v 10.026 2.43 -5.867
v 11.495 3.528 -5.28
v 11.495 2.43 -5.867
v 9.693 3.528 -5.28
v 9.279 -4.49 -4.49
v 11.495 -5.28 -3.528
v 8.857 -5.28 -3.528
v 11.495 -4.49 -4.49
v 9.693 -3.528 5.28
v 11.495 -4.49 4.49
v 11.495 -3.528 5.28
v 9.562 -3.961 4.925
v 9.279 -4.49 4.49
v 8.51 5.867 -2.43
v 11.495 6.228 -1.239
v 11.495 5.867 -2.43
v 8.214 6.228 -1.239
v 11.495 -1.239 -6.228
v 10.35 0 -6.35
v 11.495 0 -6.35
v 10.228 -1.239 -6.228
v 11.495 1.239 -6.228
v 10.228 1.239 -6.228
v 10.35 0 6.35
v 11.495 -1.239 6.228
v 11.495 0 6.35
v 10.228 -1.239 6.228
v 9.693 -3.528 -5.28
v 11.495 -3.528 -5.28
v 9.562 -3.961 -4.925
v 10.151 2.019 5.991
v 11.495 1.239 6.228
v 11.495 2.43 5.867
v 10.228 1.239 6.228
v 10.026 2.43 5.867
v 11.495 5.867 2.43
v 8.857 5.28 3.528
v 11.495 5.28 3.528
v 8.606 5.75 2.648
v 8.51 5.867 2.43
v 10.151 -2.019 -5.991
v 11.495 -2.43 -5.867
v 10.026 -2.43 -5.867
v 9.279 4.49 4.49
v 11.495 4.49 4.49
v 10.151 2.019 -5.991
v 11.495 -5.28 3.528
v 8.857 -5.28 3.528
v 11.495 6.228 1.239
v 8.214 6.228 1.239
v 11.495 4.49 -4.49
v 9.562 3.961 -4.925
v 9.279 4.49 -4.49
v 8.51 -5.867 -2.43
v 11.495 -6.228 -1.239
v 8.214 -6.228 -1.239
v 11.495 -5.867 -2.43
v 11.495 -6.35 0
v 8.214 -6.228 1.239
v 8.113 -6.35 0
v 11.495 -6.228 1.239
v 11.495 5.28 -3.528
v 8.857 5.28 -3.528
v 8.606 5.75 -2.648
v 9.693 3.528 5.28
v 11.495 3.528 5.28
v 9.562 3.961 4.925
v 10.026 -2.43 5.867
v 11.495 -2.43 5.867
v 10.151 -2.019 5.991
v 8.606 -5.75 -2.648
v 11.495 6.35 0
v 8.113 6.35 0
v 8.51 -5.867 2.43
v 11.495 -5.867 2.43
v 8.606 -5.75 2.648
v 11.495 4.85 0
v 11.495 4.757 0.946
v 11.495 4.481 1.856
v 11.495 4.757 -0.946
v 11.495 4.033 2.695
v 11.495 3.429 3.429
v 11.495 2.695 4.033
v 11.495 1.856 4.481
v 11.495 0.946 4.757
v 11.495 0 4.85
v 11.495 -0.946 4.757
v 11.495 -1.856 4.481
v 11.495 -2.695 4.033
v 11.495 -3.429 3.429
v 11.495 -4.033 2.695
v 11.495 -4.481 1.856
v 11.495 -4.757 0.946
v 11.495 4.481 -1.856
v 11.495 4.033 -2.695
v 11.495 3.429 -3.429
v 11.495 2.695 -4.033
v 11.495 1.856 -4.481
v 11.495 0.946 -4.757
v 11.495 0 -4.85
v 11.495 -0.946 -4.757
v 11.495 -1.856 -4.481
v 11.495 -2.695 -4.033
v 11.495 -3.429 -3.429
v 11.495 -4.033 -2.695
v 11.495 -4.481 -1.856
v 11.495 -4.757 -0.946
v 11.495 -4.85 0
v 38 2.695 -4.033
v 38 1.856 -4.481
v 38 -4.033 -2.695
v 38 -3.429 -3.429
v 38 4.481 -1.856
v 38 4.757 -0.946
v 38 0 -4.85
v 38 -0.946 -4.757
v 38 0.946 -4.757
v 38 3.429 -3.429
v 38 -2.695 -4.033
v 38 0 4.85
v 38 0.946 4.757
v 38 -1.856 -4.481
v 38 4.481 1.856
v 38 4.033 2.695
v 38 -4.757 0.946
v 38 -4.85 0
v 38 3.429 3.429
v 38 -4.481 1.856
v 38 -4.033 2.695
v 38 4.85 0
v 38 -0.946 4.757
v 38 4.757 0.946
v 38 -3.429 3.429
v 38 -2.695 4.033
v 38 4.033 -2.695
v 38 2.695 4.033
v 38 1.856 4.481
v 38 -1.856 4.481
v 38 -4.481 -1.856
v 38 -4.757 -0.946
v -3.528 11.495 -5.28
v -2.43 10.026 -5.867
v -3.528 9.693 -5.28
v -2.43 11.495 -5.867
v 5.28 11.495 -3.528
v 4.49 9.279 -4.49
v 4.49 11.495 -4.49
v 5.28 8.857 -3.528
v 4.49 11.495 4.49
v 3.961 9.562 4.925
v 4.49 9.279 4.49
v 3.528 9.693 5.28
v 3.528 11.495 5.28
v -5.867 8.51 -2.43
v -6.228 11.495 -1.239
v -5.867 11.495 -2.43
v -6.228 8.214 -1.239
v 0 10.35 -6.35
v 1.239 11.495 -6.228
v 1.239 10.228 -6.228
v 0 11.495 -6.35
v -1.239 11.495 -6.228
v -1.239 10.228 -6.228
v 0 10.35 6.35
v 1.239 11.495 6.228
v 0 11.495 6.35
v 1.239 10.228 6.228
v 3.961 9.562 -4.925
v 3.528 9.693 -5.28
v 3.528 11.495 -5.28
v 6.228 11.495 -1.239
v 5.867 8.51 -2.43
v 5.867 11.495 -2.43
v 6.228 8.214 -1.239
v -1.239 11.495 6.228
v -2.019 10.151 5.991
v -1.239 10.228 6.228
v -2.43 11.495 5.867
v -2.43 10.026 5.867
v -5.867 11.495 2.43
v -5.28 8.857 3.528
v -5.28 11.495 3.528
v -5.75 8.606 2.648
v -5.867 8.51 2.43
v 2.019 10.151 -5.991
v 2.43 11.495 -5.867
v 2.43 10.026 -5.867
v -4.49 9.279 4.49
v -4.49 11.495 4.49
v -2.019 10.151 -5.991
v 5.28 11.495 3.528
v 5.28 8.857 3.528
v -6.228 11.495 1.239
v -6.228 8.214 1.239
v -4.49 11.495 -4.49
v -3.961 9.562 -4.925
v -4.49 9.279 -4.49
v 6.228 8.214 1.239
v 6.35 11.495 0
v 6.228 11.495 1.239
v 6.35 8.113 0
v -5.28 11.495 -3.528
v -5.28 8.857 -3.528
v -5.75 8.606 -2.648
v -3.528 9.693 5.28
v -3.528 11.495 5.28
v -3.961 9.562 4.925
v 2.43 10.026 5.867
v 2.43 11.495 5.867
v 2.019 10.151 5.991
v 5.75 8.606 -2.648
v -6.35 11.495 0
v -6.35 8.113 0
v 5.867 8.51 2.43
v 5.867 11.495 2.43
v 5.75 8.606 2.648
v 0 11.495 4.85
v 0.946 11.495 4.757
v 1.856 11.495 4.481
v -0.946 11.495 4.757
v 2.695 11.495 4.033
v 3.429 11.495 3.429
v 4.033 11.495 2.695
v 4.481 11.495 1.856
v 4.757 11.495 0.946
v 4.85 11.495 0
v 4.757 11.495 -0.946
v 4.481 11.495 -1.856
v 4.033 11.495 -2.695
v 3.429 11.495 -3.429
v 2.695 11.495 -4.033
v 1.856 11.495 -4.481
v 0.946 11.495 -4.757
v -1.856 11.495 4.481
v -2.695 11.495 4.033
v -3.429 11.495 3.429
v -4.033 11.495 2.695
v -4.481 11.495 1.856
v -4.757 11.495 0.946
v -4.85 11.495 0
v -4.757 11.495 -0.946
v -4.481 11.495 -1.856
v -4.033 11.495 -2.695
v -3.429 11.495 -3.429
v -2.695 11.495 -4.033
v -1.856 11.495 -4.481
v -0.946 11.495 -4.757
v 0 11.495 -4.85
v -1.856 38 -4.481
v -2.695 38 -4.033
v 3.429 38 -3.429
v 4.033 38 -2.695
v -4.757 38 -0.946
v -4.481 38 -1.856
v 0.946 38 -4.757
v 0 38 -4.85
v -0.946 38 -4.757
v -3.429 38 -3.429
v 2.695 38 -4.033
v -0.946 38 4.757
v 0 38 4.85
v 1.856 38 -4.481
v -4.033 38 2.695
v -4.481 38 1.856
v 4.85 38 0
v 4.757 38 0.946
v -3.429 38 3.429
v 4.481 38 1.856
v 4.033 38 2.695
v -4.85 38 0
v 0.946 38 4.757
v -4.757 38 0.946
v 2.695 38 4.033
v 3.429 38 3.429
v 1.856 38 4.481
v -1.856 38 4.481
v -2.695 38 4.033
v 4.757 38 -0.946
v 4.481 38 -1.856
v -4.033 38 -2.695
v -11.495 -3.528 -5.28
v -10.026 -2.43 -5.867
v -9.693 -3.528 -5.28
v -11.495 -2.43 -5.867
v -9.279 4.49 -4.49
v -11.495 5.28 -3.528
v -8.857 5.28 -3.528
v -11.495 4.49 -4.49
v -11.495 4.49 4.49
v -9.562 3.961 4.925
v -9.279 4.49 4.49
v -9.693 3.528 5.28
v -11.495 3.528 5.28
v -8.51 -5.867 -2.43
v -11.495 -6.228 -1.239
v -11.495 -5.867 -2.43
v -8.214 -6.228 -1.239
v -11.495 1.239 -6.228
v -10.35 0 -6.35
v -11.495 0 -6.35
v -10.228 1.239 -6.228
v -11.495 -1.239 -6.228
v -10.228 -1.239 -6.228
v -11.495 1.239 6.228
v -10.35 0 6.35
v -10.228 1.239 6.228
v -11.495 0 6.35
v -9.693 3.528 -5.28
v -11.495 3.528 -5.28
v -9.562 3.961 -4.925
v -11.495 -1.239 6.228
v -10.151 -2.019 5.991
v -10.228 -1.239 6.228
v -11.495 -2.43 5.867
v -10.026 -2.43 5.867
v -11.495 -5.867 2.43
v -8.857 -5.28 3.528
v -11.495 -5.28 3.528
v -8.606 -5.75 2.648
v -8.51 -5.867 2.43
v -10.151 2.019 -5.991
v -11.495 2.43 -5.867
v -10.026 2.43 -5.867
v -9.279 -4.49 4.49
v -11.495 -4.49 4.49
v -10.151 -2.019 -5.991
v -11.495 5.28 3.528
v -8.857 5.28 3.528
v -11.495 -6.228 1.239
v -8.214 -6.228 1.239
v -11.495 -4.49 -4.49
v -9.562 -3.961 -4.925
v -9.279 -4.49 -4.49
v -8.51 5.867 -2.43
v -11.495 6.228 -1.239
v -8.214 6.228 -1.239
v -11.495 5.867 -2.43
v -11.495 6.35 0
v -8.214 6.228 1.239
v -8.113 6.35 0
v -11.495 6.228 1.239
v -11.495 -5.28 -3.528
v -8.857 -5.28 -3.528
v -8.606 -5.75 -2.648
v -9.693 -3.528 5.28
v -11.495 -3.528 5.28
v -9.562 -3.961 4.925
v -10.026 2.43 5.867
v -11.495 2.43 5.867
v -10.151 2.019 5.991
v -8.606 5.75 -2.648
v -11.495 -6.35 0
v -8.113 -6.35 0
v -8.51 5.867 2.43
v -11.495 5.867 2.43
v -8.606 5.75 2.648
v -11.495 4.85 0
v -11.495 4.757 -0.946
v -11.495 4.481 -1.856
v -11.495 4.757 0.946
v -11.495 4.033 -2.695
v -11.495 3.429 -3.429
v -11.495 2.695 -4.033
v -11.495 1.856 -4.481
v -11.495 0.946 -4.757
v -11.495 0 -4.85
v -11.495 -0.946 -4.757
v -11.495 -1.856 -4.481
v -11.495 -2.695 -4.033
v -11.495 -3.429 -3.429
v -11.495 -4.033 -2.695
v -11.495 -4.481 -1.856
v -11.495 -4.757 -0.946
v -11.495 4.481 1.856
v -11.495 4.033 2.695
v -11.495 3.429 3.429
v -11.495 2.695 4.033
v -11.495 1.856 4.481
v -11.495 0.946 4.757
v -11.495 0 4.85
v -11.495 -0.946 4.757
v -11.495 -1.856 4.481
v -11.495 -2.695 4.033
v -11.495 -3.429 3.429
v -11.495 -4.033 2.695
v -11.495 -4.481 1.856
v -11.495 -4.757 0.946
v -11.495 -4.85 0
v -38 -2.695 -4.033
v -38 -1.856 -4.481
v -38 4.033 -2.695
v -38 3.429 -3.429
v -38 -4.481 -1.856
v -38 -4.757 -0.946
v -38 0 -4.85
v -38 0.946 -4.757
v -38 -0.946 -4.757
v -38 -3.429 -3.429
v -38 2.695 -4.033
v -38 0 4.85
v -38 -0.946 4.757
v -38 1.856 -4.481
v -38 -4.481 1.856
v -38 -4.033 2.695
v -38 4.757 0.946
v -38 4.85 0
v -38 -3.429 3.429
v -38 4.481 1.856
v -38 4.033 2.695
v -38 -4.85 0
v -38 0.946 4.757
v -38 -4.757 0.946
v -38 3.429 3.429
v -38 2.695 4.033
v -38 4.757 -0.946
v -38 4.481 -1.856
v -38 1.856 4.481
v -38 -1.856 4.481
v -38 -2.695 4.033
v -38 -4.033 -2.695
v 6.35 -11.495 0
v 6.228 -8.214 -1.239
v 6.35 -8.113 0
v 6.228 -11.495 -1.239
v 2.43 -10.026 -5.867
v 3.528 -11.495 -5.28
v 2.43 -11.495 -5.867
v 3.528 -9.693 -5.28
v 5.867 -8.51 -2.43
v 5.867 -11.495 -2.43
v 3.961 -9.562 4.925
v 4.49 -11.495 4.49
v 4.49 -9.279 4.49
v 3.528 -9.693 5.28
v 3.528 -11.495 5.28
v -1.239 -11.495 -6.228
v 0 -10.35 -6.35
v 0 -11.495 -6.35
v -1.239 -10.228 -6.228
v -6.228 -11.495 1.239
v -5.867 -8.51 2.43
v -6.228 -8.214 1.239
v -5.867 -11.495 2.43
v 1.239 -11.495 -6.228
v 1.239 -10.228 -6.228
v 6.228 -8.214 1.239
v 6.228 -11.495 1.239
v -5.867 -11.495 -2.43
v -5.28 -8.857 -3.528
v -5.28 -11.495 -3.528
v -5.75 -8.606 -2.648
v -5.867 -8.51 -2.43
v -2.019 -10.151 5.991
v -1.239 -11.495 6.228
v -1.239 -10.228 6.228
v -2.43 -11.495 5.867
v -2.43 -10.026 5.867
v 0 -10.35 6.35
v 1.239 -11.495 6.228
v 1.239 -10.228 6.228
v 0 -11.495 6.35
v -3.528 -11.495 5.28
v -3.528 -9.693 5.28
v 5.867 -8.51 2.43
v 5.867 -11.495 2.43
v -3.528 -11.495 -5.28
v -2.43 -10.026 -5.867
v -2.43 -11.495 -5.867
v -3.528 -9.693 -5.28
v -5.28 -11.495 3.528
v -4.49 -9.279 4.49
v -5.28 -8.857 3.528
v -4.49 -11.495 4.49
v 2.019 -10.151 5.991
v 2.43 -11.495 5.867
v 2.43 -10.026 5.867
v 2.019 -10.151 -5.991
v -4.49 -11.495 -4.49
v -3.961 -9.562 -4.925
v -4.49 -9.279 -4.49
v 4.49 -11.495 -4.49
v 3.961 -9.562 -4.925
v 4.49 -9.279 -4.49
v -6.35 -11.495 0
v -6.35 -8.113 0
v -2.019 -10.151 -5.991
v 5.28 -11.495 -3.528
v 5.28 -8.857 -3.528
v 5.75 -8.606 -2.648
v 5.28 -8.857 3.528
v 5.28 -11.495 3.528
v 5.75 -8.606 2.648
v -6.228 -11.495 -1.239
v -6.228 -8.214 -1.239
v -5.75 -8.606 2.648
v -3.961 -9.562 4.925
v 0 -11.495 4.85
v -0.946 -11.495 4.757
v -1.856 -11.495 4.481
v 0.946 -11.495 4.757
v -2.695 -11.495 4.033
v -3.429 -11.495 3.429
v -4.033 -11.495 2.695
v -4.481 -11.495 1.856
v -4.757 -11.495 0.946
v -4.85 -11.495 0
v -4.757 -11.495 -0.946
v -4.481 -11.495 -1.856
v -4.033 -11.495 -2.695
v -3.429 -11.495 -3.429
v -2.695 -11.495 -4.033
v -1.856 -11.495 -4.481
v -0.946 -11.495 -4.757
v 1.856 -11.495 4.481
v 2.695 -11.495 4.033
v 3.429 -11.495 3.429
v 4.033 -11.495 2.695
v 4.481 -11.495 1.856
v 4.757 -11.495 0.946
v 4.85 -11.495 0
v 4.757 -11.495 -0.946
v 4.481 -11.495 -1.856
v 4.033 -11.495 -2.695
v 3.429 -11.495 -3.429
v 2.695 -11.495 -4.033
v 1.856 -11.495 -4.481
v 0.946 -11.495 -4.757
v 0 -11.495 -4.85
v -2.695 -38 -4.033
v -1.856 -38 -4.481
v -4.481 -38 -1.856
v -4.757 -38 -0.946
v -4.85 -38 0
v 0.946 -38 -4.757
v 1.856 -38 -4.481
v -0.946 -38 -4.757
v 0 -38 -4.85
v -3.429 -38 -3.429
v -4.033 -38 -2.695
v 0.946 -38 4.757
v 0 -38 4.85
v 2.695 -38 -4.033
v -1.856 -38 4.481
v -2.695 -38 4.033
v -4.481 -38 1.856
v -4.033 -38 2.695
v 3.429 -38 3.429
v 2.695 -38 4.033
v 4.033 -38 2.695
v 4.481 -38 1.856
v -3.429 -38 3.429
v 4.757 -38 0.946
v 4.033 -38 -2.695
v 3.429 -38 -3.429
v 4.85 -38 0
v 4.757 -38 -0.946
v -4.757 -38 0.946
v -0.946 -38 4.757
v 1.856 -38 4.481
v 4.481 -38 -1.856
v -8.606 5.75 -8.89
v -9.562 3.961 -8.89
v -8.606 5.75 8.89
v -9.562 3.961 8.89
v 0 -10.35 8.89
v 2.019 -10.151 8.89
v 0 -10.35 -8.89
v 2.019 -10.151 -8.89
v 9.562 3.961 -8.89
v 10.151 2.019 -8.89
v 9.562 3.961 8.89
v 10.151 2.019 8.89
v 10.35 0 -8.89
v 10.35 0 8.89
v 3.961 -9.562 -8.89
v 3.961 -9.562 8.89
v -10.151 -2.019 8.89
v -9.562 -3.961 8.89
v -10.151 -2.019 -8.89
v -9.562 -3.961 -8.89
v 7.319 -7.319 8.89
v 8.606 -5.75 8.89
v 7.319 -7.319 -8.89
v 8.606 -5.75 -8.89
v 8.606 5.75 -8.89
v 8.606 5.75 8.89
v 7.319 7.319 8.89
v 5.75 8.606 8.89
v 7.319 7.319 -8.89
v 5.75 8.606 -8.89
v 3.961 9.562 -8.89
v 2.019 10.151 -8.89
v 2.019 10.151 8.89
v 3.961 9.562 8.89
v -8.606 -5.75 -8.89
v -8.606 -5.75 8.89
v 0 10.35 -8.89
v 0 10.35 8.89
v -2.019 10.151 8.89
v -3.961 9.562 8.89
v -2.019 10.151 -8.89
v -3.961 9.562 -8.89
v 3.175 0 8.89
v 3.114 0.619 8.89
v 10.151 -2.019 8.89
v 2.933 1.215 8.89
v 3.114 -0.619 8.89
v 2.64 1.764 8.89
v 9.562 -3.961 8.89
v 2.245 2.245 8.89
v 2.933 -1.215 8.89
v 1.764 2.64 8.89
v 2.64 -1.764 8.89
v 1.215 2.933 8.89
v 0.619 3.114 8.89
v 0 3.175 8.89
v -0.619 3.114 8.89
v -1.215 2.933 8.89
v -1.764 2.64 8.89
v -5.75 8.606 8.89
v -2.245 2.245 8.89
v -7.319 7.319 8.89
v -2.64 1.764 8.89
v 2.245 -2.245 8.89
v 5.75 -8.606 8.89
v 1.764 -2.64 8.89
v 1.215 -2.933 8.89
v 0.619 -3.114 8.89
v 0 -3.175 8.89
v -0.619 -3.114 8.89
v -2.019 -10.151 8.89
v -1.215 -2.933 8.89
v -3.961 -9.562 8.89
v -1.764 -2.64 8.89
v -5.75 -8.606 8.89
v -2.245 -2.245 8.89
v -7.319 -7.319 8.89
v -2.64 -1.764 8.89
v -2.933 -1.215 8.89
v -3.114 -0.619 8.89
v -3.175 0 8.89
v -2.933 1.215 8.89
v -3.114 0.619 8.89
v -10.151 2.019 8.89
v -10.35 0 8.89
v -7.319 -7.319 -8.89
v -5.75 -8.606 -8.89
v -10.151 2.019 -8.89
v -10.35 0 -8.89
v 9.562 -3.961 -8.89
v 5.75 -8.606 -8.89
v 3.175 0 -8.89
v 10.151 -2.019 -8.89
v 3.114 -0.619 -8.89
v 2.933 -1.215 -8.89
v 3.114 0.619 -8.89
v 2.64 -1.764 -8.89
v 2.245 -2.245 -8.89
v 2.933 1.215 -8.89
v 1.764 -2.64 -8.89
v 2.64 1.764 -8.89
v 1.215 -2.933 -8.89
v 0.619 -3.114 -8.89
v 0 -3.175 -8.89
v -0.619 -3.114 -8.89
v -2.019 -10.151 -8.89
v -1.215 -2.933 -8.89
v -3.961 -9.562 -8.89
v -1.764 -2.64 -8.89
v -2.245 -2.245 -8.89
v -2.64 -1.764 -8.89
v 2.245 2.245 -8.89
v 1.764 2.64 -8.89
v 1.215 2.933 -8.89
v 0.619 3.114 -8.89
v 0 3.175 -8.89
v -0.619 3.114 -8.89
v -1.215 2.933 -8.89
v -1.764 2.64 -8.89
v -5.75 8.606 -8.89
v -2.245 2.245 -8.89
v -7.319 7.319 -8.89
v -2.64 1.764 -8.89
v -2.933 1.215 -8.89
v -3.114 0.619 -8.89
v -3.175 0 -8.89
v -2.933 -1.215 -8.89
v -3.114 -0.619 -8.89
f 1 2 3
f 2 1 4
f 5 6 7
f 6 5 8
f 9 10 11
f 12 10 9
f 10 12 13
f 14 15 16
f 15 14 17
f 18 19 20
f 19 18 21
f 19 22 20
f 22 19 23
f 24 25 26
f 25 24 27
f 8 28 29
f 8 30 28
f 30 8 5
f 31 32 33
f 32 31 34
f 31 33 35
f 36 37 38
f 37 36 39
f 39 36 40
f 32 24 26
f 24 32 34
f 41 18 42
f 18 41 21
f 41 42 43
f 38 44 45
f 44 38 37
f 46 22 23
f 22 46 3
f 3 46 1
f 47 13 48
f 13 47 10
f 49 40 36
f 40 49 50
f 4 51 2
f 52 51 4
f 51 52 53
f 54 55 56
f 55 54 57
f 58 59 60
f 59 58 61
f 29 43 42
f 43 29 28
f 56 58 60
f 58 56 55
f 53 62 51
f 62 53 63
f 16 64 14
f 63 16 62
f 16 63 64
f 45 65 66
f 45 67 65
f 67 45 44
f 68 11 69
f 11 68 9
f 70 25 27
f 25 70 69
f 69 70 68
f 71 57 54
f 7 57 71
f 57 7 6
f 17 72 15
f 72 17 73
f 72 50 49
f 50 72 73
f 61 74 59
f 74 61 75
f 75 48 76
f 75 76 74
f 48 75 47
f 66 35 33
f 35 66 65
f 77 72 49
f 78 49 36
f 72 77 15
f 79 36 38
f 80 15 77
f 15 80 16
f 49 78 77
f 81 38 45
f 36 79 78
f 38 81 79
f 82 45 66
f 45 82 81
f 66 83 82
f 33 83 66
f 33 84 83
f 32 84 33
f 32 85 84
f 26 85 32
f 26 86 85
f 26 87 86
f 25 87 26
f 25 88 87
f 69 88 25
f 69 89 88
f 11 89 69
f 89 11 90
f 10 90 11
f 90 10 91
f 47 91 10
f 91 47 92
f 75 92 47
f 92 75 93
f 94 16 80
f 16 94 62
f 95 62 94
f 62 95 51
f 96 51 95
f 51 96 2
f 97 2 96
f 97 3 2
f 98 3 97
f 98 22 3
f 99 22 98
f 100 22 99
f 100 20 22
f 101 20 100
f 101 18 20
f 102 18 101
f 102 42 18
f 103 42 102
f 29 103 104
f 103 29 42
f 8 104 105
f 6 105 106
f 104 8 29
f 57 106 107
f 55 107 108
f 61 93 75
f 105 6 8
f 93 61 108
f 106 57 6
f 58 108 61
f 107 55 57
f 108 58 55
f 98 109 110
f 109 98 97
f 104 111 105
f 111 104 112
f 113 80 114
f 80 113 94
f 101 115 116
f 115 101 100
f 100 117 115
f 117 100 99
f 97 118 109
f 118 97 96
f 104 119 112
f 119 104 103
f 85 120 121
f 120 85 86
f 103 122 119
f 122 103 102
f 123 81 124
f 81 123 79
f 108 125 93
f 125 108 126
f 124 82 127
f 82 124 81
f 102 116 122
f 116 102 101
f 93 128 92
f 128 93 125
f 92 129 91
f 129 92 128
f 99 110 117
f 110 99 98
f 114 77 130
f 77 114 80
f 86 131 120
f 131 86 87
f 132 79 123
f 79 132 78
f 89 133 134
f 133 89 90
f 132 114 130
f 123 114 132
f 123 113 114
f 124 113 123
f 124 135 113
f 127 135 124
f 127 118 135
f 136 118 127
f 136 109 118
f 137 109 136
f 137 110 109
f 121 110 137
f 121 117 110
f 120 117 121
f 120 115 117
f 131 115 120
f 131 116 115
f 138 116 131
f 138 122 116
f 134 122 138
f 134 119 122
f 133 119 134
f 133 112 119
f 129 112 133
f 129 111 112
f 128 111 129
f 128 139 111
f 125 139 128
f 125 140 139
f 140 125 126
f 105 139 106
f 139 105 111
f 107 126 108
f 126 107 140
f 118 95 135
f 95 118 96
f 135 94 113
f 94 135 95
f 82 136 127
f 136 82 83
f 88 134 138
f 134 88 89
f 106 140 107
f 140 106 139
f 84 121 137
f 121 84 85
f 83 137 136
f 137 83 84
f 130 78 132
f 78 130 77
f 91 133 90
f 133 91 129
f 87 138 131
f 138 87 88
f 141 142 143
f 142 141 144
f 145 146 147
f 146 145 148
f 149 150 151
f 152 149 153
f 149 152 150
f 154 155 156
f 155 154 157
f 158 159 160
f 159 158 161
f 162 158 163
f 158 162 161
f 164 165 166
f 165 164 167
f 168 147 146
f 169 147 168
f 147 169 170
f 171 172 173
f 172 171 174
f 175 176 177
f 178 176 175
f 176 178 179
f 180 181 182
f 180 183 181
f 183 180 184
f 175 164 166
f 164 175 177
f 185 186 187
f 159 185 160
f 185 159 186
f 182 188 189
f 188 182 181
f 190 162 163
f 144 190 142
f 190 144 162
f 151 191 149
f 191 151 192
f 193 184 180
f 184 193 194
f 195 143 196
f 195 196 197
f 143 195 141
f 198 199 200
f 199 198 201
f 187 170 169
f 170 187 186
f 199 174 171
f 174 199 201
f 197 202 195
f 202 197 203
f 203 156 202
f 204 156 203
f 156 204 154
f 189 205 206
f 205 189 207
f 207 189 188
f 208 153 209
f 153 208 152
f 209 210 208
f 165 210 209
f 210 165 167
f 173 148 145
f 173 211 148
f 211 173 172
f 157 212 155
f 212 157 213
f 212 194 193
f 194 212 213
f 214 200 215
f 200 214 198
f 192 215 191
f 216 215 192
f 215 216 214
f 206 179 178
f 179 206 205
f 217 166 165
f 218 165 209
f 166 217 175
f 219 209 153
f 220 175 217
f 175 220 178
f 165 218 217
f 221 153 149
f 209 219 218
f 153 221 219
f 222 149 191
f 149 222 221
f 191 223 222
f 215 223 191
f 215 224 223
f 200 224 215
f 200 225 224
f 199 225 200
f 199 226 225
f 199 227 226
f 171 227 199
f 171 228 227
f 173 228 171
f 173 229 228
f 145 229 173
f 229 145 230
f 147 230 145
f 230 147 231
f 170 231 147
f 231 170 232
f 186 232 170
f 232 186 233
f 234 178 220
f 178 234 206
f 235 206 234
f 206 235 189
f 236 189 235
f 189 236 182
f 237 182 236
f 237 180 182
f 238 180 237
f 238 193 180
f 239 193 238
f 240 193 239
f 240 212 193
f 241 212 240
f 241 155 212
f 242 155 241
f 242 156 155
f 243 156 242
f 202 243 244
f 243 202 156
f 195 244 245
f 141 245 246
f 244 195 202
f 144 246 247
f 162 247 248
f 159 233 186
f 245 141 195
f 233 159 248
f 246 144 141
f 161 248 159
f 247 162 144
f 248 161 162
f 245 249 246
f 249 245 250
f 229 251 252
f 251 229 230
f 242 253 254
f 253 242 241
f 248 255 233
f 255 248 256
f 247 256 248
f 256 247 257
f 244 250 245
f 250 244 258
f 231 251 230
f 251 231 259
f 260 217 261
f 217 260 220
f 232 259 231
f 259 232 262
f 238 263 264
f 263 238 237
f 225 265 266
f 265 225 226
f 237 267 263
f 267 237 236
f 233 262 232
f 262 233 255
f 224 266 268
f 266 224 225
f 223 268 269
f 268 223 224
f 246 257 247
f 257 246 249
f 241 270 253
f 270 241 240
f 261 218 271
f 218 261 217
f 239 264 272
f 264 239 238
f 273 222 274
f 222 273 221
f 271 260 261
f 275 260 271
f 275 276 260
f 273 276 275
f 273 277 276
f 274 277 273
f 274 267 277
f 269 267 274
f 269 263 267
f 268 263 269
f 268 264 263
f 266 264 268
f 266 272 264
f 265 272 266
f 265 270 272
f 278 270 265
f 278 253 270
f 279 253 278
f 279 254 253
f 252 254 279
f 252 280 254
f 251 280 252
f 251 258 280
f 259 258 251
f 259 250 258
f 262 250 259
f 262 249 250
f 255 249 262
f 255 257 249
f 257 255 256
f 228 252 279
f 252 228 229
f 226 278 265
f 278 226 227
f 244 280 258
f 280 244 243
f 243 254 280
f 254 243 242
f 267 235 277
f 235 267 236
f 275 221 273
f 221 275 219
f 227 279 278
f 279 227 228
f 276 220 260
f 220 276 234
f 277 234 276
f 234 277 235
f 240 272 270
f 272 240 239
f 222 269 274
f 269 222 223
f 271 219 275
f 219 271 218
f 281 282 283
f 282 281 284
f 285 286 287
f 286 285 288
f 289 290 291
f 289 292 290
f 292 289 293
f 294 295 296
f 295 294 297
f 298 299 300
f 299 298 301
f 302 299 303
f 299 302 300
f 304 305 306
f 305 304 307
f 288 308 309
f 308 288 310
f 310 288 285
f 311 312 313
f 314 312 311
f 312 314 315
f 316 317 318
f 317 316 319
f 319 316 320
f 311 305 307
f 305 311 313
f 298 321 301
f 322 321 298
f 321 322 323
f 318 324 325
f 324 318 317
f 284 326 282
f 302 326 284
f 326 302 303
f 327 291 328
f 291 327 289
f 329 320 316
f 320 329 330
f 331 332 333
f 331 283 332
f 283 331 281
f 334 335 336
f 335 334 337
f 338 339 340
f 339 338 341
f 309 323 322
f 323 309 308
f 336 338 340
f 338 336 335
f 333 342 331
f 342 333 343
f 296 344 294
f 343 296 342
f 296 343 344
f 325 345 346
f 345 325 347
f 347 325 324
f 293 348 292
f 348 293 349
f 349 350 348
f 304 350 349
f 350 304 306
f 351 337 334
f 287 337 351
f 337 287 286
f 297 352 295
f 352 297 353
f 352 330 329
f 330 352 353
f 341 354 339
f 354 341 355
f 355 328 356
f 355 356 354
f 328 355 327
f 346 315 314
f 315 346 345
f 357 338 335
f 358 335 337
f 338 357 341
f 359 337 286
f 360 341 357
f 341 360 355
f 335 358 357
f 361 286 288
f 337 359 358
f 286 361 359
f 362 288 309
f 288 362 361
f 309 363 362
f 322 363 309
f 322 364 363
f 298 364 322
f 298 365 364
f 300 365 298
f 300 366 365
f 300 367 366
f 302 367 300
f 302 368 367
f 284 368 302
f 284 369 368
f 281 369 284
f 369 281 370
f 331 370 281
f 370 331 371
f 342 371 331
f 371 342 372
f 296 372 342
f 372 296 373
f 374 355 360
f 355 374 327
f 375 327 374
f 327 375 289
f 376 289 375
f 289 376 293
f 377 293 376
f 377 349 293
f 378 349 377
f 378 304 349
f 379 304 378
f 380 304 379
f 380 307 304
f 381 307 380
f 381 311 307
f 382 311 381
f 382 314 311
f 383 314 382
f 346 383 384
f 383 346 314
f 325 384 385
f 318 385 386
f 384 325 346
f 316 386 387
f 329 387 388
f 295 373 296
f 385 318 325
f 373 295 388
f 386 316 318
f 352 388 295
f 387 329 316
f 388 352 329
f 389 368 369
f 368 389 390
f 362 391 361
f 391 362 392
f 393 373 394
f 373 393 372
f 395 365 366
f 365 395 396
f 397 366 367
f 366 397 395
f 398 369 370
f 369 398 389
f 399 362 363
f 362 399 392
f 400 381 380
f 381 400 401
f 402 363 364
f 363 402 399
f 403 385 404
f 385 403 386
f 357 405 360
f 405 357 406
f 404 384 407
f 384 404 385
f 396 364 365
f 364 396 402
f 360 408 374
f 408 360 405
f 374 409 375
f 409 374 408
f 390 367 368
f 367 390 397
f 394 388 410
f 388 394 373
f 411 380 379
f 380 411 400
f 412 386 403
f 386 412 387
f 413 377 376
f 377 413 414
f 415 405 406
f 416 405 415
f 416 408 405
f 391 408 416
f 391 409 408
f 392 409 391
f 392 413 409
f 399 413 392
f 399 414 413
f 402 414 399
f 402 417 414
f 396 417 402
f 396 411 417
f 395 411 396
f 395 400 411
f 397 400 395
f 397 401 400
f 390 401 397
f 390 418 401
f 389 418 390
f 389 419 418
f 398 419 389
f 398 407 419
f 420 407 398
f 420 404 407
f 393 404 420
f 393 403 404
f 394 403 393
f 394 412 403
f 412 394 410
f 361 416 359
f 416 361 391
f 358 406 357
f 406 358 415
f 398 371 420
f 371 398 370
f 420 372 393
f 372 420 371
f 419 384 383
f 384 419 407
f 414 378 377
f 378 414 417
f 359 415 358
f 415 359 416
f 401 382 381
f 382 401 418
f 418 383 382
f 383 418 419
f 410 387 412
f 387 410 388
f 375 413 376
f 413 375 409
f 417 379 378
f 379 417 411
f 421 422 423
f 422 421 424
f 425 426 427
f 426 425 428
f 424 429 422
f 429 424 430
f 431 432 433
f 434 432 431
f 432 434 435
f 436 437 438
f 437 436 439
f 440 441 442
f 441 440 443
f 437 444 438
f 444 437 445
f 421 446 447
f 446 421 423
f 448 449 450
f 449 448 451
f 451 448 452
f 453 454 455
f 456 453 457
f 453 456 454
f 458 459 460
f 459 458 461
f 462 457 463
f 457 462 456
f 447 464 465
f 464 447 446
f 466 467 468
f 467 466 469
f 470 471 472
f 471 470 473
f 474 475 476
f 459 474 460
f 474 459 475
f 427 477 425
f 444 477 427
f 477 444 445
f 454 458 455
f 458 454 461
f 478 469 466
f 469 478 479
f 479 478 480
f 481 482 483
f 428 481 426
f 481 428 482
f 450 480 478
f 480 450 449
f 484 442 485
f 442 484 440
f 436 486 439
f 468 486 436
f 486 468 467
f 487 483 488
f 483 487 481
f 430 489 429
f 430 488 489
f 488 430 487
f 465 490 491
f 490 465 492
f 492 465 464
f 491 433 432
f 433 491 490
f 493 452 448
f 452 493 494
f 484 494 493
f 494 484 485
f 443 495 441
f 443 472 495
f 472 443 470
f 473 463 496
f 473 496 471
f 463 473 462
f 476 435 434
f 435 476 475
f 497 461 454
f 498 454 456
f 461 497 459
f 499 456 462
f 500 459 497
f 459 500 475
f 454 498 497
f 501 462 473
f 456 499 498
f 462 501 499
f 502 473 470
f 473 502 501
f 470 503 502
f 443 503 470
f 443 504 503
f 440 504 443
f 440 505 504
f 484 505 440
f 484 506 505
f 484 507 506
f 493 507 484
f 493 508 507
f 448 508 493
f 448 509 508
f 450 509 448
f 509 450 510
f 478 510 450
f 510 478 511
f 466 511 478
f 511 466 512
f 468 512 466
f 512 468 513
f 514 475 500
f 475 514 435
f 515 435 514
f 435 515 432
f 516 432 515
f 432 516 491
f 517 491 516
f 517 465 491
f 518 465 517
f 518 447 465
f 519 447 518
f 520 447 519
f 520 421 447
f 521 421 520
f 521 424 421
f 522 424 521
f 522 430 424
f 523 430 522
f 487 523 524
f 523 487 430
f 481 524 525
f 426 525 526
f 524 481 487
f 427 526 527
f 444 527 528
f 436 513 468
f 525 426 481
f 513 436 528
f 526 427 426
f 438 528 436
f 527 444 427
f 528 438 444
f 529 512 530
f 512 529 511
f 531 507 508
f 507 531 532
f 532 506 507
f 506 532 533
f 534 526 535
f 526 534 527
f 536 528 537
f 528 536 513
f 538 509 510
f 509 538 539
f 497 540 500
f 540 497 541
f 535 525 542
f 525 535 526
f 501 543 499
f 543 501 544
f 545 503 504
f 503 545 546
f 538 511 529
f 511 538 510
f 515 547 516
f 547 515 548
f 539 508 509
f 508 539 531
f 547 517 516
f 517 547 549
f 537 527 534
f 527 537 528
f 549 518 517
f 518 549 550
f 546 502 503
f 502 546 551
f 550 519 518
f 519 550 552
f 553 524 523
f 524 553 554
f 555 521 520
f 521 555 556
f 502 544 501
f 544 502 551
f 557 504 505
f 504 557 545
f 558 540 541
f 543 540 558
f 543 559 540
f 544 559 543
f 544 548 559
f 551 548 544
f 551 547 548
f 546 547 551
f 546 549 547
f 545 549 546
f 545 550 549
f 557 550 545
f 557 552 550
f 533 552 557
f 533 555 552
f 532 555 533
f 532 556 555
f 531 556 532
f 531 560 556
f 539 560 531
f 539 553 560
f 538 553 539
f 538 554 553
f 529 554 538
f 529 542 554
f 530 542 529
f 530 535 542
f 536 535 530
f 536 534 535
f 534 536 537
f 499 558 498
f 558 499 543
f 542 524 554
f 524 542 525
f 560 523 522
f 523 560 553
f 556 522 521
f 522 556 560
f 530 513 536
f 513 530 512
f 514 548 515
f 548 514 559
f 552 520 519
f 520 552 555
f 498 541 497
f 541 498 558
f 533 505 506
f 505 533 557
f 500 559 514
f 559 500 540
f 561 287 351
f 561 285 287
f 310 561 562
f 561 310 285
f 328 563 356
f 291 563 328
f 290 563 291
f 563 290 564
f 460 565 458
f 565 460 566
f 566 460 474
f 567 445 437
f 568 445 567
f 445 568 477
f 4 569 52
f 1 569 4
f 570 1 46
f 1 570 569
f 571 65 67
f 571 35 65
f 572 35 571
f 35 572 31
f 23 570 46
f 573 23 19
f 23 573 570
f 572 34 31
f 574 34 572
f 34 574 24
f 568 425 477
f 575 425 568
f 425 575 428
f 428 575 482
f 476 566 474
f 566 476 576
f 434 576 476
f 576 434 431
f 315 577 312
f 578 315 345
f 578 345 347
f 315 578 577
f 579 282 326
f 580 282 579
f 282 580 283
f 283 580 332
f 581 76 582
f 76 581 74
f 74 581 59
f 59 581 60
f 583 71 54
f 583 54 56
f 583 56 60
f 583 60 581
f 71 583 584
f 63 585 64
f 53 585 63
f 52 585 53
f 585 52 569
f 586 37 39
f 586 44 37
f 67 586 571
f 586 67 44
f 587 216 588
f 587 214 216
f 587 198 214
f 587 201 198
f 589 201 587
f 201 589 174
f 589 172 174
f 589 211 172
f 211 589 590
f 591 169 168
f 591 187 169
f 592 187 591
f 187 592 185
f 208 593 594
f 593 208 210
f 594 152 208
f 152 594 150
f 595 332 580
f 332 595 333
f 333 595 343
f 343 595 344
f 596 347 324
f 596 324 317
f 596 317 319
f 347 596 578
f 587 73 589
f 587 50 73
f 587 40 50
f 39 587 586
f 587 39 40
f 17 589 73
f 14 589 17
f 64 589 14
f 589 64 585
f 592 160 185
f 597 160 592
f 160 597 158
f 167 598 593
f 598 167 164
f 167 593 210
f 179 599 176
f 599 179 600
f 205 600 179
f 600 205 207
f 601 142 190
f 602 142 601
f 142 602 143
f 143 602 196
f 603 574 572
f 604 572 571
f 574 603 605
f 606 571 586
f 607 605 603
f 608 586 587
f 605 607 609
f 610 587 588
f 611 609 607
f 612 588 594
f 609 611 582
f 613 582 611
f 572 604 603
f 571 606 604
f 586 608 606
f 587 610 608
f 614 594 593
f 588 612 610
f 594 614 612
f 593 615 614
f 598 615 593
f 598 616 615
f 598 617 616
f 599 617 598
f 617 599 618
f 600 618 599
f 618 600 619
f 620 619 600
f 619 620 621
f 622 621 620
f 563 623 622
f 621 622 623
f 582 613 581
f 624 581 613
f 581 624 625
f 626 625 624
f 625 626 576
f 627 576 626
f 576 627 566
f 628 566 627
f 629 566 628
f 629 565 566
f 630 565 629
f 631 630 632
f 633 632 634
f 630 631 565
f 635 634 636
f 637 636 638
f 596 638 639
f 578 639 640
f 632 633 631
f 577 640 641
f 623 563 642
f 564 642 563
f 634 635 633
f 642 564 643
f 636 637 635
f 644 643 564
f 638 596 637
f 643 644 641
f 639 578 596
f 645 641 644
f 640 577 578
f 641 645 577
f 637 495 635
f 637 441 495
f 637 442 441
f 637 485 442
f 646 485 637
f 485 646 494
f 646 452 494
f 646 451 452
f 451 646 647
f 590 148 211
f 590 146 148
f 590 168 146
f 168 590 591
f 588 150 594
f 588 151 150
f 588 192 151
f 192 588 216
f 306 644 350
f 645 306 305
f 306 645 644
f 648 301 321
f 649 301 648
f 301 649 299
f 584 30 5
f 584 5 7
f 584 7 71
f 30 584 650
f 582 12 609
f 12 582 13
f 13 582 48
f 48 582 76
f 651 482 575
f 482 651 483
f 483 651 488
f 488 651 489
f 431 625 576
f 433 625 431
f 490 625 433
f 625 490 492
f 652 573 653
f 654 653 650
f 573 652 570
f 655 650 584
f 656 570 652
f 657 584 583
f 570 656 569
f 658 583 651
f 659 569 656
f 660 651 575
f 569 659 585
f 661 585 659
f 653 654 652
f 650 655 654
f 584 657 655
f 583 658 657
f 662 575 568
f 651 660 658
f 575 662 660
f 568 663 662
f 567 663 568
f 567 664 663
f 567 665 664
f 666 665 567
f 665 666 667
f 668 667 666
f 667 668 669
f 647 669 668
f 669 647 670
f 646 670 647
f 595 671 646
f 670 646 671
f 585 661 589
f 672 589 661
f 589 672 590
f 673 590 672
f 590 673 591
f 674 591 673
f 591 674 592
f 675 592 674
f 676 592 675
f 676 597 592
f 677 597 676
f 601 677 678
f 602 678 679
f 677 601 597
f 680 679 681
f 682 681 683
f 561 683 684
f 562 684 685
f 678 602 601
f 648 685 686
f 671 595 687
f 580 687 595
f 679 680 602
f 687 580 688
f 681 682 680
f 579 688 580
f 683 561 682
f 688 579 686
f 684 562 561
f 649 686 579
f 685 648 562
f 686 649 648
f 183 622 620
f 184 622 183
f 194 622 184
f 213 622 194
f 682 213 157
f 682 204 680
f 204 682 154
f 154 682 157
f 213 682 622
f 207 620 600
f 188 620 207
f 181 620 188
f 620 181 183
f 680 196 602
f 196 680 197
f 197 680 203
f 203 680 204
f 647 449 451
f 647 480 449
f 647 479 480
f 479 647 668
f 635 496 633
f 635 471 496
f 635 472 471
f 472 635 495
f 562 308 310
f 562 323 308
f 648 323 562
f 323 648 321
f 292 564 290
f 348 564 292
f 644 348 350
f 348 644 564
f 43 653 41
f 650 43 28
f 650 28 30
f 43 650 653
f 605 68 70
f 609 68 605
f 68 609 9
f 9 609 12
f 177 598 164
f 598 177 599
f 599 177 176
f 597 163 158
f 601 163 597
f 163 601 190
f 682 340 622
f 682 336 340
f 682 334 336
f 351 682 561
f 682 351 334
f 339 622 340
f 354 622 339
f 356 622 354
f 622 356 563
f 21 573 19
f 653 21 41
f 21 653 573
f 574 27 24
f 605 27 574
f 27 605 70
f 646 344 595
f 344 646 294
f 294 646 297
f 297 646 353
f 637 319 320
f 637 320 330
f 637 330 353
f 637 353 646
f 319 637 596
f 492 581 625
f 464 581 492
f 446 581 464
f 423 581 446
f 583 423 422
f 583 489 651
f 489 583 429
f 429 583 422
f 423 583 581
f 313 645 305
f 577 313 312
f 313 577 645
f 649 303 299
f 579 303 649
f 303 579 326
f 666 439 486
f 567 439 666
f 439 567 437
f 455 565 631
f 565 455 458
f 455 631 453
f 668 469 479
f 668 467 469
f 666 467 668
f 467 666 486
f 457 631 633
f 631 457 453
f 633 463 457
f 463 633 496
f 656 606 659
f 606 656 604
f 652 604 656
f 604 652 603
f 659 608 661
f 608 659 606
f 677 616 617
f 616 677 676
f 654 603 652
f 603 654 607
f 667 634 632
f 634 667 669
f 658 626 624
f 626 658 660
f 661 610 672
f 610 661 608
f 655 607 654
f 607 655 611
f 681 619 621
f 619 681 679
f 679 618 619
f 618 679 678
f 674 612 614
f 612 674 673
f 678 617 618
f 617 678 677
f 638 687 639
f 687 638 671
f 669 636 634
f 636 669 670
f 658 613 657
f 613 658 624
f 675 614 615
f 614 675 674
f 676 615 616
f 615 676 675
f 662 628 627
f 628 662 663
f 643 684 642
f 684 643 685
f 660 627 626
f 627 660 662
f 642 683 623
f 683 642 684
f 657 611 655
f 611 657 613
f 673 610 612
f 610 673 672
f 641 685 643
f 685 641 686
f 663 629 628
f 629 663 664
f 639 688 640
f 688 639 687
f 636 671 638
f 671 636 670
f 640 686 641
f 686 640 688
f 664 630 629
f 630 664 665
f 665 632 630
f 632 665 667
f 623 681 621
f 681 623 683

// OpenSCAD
$fn = 32;

// ----------------------------------------------------------------------
// Cardan cross: 76 mm span, 12.7 mm trunnions
// ----------------------------------------------------------------------

// --- parameters (mm) ---
journal_d = 12.7;         // trunnion diameter
arm_len = 38;             // trunnion length from the centre
step_r = 4.32;            // step position from the centre
step_d = 9.7;             // journal diameter after the step
hub_d = 20.7;             // hub diameter
hub_h = 17.78;            // hub height
bore_d = 6.35;            // hub bore

difference() {
  union() {
    /* hub along the joint axis */
    cylinder(h = hub_h, d = hub_d, center = true);
    for (a = [0 : 90 : 270]) rotate([0, 0, a]) {
      /* trunnion, sunk into the hub */
      translate([hub_d / 4, 0, 0]) rotate([0, 90, 0]) cylinder(h = step_r + 2, d = journal_d);
      /* stepped journal out to the tip */
      translate([step_r - 0.5, 0, 0]) rotate([0, 90, 0]) cylinder(h = arm_len + 0.5 - step_r, d = step_d);
    }
  }
  /* lubrication bore through the hub, 2.5 mm clear on both sides */
  translate([0, 0, -hub_h / 2 - 2.5]) cylinder(h = hub_h + 5, d = bore_d);
}
